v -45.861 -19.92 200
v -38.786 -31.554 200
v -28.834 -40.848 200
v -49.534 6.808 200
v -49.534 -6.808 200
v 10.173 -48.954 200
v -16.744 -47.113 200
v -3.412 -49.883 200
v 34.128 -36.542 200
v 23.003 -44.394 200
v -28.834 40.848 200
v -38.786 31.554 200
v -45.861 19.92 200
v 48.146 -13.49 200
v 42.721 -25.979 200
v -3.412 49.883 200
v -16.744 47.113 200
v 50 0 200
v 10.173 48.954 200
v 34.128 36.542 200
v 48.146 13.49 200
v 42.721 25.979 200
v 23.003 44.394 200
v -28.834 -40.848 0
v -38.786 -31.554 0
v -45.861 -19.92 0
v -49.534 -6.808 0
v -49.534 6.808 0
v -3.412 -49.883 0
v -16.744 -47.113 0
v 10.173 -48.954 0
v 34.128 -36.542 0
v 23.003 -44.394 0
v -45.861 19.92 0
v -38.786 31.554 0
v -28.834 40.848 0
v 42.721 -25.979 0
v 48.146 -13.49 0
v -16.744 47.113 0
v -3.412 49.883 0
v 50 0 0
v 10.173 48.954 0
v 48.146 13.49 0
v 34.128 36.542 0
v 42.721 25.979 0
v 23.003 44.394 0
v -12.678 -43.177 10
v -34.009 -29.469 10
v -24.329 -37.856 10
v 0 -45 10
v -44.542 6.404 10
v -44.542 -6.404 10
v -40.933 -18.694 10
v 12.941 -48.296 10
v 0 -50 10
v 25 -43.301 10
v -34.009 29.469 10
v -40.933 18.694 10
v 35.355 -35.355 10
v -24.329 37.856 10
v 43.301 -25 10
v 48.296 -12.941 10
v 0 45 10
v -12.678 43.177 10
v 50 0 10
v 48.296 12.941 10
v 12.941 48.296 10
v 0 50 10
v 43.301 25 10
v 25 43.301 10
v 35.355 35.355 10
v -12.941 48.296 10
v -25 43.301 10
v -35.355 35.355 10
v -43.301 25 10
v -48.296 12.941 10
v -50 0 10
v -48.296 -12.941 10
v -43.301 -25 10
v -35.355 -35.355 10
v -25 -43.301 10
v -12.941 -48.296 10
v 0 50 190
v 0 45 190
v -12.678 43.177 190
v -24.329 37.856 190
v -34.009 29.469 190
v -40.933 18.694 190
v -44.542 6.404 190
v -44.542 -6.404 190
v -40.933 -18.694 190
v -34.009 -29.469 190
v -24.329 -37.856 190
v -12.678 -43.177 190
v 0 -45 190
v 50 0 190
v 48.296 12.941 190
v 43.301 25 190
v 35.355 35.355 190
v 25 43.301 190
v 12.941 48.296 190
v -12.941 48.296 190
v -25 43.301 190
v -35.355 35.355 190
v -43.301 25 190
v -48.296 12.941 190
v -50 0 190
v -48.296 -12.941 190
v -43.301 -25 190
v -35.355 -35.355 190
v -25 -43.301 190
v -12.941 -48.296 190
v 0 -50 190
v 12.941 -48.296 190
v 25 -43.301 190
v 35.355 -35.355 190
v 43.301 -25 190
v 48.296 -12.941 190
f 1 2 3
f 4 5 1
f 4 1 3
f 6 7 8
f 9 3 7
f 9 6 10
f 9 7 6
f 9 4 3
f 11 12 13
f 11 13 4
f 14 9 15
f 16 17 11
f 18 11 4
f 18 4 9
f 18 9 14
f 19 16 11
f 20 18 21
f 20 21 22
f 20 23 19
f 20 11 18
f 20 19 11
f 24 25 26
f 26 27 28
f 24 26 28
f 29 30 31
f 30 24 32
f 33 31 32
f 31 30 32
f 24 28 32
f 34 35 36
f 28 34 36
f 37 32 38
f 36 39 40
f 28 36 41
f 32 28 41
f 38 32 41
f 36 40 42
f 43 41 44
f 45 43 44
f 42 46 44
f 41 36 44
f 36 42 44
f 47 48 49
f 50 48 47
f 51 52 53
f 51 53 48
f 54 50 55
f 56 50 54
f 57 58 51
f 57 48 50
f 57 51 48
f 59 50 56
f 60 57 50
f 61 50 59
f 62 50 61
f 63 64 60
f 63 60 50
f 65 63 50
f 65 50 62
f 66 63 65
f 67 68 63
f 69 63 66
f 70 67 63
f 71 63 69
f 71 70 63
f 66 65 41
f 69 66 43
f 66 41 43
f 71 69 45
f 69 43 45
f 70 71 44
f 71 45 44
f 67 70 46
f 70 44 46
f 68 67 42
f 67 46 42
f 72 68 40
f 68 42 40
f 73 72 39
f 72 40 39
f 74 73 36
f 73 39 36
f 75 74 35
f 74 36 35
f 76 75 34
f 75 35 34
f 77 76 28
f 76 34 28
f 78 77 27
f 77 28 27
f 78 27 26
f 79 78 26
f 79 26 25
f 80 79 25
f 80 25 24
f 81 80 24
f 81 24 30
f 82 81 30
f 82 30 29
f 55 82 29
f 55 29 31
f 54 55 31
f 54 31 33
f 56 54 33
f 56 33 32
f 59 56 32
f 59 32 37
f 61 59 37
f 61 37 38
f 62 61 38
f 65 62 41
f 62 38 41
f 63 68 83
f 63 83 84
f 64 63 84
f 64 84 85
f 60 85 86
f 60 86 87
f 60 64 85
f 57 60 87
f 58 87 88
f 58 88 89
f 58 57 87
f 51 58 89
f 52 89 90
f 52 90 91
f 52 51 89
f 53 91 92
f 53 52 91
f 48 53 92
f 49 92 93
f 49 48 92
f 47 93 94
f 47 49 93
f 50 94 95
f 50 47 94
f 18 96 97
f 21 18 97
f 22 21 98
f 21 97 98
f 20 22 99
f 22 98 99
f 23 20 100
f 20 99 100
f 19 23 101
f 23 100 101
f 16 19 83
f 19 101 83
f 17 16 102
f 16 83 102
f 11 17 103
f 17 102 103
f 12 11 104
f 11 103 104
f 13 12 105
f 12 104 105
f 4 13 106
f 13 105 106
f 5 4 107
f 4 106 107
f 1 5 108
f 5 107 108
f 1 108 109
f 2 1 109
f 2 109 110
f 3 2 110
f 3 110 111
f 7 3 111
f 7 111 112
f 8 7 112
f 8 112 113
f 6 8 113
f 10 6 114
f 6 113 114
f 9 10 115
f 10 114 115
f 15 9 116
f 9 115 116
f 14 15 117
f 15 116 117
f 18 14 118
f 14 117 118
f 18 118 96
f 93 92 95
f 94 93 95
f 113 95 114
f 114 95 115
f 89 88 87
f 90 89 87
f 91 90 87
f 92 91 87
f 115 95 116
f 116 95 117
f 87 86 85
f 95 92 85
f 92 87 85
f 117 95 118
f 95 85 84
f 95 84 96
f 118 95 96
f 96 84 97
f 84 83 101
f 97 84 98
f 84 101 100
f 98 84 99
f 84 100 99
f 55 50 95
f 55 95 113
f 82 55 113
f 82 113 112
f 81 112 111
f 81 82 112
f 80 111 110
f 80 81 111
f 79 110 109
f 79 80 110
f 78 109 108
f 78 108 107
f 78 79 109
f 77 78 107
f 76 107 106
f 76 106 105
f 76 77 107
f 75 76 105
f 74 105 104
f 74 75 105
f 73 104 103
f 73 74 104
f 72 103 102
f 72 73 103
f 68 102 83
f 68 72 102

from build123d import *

# Parameters (mm, degrees)
SKETCH1_R           = 50
BOSS_EXTRUDE1_DEPTH = 10
BOSS_EXTRUDE2_DEPTH = 180
SKETCH3_R           = 50
BOSS_EXTRUDE3_DEPTH = 10


with BuildPart() as part:
    # Sketch1 → Boss-Extrude1 (new body)
    with BuildSketch(Plane(origin=(0, 0, 0), x_dir=(0, 1, 0), z_dir=(0, 0, 1))):
        with Locations(Location((0, 0, 0), (0, 0, 270))):
            Circle(SKETCH1_R)
    extrude(amount=BOSS_EXTRUDE1_DEPTH)

    # Sketch2 → Boss-Extrude2 (add)
    with BuildSketch(Plane.XY.offset(10)):
        with BuildLine():
            Line((0, 50), (0, 45))
            ThreePointArc((0, 45), (-45, 0), (0, -45))
            Line((0, -45), (0, -50))
            ThreePointArc((0, -50), (-50, 0), (0, 50))
        make_face()
    extrude(amount=BOSS_EXTRUDE2_DEPTH)

    # Sketch3 → Boss-Extrude3 (add)
    with BuildSketch(Plane.XY.offset(190)):
        Circle(SKETCH3_R)
    extrude(amount=BOSS_EXTRUDE3_DEPTH)


solid = part.part
